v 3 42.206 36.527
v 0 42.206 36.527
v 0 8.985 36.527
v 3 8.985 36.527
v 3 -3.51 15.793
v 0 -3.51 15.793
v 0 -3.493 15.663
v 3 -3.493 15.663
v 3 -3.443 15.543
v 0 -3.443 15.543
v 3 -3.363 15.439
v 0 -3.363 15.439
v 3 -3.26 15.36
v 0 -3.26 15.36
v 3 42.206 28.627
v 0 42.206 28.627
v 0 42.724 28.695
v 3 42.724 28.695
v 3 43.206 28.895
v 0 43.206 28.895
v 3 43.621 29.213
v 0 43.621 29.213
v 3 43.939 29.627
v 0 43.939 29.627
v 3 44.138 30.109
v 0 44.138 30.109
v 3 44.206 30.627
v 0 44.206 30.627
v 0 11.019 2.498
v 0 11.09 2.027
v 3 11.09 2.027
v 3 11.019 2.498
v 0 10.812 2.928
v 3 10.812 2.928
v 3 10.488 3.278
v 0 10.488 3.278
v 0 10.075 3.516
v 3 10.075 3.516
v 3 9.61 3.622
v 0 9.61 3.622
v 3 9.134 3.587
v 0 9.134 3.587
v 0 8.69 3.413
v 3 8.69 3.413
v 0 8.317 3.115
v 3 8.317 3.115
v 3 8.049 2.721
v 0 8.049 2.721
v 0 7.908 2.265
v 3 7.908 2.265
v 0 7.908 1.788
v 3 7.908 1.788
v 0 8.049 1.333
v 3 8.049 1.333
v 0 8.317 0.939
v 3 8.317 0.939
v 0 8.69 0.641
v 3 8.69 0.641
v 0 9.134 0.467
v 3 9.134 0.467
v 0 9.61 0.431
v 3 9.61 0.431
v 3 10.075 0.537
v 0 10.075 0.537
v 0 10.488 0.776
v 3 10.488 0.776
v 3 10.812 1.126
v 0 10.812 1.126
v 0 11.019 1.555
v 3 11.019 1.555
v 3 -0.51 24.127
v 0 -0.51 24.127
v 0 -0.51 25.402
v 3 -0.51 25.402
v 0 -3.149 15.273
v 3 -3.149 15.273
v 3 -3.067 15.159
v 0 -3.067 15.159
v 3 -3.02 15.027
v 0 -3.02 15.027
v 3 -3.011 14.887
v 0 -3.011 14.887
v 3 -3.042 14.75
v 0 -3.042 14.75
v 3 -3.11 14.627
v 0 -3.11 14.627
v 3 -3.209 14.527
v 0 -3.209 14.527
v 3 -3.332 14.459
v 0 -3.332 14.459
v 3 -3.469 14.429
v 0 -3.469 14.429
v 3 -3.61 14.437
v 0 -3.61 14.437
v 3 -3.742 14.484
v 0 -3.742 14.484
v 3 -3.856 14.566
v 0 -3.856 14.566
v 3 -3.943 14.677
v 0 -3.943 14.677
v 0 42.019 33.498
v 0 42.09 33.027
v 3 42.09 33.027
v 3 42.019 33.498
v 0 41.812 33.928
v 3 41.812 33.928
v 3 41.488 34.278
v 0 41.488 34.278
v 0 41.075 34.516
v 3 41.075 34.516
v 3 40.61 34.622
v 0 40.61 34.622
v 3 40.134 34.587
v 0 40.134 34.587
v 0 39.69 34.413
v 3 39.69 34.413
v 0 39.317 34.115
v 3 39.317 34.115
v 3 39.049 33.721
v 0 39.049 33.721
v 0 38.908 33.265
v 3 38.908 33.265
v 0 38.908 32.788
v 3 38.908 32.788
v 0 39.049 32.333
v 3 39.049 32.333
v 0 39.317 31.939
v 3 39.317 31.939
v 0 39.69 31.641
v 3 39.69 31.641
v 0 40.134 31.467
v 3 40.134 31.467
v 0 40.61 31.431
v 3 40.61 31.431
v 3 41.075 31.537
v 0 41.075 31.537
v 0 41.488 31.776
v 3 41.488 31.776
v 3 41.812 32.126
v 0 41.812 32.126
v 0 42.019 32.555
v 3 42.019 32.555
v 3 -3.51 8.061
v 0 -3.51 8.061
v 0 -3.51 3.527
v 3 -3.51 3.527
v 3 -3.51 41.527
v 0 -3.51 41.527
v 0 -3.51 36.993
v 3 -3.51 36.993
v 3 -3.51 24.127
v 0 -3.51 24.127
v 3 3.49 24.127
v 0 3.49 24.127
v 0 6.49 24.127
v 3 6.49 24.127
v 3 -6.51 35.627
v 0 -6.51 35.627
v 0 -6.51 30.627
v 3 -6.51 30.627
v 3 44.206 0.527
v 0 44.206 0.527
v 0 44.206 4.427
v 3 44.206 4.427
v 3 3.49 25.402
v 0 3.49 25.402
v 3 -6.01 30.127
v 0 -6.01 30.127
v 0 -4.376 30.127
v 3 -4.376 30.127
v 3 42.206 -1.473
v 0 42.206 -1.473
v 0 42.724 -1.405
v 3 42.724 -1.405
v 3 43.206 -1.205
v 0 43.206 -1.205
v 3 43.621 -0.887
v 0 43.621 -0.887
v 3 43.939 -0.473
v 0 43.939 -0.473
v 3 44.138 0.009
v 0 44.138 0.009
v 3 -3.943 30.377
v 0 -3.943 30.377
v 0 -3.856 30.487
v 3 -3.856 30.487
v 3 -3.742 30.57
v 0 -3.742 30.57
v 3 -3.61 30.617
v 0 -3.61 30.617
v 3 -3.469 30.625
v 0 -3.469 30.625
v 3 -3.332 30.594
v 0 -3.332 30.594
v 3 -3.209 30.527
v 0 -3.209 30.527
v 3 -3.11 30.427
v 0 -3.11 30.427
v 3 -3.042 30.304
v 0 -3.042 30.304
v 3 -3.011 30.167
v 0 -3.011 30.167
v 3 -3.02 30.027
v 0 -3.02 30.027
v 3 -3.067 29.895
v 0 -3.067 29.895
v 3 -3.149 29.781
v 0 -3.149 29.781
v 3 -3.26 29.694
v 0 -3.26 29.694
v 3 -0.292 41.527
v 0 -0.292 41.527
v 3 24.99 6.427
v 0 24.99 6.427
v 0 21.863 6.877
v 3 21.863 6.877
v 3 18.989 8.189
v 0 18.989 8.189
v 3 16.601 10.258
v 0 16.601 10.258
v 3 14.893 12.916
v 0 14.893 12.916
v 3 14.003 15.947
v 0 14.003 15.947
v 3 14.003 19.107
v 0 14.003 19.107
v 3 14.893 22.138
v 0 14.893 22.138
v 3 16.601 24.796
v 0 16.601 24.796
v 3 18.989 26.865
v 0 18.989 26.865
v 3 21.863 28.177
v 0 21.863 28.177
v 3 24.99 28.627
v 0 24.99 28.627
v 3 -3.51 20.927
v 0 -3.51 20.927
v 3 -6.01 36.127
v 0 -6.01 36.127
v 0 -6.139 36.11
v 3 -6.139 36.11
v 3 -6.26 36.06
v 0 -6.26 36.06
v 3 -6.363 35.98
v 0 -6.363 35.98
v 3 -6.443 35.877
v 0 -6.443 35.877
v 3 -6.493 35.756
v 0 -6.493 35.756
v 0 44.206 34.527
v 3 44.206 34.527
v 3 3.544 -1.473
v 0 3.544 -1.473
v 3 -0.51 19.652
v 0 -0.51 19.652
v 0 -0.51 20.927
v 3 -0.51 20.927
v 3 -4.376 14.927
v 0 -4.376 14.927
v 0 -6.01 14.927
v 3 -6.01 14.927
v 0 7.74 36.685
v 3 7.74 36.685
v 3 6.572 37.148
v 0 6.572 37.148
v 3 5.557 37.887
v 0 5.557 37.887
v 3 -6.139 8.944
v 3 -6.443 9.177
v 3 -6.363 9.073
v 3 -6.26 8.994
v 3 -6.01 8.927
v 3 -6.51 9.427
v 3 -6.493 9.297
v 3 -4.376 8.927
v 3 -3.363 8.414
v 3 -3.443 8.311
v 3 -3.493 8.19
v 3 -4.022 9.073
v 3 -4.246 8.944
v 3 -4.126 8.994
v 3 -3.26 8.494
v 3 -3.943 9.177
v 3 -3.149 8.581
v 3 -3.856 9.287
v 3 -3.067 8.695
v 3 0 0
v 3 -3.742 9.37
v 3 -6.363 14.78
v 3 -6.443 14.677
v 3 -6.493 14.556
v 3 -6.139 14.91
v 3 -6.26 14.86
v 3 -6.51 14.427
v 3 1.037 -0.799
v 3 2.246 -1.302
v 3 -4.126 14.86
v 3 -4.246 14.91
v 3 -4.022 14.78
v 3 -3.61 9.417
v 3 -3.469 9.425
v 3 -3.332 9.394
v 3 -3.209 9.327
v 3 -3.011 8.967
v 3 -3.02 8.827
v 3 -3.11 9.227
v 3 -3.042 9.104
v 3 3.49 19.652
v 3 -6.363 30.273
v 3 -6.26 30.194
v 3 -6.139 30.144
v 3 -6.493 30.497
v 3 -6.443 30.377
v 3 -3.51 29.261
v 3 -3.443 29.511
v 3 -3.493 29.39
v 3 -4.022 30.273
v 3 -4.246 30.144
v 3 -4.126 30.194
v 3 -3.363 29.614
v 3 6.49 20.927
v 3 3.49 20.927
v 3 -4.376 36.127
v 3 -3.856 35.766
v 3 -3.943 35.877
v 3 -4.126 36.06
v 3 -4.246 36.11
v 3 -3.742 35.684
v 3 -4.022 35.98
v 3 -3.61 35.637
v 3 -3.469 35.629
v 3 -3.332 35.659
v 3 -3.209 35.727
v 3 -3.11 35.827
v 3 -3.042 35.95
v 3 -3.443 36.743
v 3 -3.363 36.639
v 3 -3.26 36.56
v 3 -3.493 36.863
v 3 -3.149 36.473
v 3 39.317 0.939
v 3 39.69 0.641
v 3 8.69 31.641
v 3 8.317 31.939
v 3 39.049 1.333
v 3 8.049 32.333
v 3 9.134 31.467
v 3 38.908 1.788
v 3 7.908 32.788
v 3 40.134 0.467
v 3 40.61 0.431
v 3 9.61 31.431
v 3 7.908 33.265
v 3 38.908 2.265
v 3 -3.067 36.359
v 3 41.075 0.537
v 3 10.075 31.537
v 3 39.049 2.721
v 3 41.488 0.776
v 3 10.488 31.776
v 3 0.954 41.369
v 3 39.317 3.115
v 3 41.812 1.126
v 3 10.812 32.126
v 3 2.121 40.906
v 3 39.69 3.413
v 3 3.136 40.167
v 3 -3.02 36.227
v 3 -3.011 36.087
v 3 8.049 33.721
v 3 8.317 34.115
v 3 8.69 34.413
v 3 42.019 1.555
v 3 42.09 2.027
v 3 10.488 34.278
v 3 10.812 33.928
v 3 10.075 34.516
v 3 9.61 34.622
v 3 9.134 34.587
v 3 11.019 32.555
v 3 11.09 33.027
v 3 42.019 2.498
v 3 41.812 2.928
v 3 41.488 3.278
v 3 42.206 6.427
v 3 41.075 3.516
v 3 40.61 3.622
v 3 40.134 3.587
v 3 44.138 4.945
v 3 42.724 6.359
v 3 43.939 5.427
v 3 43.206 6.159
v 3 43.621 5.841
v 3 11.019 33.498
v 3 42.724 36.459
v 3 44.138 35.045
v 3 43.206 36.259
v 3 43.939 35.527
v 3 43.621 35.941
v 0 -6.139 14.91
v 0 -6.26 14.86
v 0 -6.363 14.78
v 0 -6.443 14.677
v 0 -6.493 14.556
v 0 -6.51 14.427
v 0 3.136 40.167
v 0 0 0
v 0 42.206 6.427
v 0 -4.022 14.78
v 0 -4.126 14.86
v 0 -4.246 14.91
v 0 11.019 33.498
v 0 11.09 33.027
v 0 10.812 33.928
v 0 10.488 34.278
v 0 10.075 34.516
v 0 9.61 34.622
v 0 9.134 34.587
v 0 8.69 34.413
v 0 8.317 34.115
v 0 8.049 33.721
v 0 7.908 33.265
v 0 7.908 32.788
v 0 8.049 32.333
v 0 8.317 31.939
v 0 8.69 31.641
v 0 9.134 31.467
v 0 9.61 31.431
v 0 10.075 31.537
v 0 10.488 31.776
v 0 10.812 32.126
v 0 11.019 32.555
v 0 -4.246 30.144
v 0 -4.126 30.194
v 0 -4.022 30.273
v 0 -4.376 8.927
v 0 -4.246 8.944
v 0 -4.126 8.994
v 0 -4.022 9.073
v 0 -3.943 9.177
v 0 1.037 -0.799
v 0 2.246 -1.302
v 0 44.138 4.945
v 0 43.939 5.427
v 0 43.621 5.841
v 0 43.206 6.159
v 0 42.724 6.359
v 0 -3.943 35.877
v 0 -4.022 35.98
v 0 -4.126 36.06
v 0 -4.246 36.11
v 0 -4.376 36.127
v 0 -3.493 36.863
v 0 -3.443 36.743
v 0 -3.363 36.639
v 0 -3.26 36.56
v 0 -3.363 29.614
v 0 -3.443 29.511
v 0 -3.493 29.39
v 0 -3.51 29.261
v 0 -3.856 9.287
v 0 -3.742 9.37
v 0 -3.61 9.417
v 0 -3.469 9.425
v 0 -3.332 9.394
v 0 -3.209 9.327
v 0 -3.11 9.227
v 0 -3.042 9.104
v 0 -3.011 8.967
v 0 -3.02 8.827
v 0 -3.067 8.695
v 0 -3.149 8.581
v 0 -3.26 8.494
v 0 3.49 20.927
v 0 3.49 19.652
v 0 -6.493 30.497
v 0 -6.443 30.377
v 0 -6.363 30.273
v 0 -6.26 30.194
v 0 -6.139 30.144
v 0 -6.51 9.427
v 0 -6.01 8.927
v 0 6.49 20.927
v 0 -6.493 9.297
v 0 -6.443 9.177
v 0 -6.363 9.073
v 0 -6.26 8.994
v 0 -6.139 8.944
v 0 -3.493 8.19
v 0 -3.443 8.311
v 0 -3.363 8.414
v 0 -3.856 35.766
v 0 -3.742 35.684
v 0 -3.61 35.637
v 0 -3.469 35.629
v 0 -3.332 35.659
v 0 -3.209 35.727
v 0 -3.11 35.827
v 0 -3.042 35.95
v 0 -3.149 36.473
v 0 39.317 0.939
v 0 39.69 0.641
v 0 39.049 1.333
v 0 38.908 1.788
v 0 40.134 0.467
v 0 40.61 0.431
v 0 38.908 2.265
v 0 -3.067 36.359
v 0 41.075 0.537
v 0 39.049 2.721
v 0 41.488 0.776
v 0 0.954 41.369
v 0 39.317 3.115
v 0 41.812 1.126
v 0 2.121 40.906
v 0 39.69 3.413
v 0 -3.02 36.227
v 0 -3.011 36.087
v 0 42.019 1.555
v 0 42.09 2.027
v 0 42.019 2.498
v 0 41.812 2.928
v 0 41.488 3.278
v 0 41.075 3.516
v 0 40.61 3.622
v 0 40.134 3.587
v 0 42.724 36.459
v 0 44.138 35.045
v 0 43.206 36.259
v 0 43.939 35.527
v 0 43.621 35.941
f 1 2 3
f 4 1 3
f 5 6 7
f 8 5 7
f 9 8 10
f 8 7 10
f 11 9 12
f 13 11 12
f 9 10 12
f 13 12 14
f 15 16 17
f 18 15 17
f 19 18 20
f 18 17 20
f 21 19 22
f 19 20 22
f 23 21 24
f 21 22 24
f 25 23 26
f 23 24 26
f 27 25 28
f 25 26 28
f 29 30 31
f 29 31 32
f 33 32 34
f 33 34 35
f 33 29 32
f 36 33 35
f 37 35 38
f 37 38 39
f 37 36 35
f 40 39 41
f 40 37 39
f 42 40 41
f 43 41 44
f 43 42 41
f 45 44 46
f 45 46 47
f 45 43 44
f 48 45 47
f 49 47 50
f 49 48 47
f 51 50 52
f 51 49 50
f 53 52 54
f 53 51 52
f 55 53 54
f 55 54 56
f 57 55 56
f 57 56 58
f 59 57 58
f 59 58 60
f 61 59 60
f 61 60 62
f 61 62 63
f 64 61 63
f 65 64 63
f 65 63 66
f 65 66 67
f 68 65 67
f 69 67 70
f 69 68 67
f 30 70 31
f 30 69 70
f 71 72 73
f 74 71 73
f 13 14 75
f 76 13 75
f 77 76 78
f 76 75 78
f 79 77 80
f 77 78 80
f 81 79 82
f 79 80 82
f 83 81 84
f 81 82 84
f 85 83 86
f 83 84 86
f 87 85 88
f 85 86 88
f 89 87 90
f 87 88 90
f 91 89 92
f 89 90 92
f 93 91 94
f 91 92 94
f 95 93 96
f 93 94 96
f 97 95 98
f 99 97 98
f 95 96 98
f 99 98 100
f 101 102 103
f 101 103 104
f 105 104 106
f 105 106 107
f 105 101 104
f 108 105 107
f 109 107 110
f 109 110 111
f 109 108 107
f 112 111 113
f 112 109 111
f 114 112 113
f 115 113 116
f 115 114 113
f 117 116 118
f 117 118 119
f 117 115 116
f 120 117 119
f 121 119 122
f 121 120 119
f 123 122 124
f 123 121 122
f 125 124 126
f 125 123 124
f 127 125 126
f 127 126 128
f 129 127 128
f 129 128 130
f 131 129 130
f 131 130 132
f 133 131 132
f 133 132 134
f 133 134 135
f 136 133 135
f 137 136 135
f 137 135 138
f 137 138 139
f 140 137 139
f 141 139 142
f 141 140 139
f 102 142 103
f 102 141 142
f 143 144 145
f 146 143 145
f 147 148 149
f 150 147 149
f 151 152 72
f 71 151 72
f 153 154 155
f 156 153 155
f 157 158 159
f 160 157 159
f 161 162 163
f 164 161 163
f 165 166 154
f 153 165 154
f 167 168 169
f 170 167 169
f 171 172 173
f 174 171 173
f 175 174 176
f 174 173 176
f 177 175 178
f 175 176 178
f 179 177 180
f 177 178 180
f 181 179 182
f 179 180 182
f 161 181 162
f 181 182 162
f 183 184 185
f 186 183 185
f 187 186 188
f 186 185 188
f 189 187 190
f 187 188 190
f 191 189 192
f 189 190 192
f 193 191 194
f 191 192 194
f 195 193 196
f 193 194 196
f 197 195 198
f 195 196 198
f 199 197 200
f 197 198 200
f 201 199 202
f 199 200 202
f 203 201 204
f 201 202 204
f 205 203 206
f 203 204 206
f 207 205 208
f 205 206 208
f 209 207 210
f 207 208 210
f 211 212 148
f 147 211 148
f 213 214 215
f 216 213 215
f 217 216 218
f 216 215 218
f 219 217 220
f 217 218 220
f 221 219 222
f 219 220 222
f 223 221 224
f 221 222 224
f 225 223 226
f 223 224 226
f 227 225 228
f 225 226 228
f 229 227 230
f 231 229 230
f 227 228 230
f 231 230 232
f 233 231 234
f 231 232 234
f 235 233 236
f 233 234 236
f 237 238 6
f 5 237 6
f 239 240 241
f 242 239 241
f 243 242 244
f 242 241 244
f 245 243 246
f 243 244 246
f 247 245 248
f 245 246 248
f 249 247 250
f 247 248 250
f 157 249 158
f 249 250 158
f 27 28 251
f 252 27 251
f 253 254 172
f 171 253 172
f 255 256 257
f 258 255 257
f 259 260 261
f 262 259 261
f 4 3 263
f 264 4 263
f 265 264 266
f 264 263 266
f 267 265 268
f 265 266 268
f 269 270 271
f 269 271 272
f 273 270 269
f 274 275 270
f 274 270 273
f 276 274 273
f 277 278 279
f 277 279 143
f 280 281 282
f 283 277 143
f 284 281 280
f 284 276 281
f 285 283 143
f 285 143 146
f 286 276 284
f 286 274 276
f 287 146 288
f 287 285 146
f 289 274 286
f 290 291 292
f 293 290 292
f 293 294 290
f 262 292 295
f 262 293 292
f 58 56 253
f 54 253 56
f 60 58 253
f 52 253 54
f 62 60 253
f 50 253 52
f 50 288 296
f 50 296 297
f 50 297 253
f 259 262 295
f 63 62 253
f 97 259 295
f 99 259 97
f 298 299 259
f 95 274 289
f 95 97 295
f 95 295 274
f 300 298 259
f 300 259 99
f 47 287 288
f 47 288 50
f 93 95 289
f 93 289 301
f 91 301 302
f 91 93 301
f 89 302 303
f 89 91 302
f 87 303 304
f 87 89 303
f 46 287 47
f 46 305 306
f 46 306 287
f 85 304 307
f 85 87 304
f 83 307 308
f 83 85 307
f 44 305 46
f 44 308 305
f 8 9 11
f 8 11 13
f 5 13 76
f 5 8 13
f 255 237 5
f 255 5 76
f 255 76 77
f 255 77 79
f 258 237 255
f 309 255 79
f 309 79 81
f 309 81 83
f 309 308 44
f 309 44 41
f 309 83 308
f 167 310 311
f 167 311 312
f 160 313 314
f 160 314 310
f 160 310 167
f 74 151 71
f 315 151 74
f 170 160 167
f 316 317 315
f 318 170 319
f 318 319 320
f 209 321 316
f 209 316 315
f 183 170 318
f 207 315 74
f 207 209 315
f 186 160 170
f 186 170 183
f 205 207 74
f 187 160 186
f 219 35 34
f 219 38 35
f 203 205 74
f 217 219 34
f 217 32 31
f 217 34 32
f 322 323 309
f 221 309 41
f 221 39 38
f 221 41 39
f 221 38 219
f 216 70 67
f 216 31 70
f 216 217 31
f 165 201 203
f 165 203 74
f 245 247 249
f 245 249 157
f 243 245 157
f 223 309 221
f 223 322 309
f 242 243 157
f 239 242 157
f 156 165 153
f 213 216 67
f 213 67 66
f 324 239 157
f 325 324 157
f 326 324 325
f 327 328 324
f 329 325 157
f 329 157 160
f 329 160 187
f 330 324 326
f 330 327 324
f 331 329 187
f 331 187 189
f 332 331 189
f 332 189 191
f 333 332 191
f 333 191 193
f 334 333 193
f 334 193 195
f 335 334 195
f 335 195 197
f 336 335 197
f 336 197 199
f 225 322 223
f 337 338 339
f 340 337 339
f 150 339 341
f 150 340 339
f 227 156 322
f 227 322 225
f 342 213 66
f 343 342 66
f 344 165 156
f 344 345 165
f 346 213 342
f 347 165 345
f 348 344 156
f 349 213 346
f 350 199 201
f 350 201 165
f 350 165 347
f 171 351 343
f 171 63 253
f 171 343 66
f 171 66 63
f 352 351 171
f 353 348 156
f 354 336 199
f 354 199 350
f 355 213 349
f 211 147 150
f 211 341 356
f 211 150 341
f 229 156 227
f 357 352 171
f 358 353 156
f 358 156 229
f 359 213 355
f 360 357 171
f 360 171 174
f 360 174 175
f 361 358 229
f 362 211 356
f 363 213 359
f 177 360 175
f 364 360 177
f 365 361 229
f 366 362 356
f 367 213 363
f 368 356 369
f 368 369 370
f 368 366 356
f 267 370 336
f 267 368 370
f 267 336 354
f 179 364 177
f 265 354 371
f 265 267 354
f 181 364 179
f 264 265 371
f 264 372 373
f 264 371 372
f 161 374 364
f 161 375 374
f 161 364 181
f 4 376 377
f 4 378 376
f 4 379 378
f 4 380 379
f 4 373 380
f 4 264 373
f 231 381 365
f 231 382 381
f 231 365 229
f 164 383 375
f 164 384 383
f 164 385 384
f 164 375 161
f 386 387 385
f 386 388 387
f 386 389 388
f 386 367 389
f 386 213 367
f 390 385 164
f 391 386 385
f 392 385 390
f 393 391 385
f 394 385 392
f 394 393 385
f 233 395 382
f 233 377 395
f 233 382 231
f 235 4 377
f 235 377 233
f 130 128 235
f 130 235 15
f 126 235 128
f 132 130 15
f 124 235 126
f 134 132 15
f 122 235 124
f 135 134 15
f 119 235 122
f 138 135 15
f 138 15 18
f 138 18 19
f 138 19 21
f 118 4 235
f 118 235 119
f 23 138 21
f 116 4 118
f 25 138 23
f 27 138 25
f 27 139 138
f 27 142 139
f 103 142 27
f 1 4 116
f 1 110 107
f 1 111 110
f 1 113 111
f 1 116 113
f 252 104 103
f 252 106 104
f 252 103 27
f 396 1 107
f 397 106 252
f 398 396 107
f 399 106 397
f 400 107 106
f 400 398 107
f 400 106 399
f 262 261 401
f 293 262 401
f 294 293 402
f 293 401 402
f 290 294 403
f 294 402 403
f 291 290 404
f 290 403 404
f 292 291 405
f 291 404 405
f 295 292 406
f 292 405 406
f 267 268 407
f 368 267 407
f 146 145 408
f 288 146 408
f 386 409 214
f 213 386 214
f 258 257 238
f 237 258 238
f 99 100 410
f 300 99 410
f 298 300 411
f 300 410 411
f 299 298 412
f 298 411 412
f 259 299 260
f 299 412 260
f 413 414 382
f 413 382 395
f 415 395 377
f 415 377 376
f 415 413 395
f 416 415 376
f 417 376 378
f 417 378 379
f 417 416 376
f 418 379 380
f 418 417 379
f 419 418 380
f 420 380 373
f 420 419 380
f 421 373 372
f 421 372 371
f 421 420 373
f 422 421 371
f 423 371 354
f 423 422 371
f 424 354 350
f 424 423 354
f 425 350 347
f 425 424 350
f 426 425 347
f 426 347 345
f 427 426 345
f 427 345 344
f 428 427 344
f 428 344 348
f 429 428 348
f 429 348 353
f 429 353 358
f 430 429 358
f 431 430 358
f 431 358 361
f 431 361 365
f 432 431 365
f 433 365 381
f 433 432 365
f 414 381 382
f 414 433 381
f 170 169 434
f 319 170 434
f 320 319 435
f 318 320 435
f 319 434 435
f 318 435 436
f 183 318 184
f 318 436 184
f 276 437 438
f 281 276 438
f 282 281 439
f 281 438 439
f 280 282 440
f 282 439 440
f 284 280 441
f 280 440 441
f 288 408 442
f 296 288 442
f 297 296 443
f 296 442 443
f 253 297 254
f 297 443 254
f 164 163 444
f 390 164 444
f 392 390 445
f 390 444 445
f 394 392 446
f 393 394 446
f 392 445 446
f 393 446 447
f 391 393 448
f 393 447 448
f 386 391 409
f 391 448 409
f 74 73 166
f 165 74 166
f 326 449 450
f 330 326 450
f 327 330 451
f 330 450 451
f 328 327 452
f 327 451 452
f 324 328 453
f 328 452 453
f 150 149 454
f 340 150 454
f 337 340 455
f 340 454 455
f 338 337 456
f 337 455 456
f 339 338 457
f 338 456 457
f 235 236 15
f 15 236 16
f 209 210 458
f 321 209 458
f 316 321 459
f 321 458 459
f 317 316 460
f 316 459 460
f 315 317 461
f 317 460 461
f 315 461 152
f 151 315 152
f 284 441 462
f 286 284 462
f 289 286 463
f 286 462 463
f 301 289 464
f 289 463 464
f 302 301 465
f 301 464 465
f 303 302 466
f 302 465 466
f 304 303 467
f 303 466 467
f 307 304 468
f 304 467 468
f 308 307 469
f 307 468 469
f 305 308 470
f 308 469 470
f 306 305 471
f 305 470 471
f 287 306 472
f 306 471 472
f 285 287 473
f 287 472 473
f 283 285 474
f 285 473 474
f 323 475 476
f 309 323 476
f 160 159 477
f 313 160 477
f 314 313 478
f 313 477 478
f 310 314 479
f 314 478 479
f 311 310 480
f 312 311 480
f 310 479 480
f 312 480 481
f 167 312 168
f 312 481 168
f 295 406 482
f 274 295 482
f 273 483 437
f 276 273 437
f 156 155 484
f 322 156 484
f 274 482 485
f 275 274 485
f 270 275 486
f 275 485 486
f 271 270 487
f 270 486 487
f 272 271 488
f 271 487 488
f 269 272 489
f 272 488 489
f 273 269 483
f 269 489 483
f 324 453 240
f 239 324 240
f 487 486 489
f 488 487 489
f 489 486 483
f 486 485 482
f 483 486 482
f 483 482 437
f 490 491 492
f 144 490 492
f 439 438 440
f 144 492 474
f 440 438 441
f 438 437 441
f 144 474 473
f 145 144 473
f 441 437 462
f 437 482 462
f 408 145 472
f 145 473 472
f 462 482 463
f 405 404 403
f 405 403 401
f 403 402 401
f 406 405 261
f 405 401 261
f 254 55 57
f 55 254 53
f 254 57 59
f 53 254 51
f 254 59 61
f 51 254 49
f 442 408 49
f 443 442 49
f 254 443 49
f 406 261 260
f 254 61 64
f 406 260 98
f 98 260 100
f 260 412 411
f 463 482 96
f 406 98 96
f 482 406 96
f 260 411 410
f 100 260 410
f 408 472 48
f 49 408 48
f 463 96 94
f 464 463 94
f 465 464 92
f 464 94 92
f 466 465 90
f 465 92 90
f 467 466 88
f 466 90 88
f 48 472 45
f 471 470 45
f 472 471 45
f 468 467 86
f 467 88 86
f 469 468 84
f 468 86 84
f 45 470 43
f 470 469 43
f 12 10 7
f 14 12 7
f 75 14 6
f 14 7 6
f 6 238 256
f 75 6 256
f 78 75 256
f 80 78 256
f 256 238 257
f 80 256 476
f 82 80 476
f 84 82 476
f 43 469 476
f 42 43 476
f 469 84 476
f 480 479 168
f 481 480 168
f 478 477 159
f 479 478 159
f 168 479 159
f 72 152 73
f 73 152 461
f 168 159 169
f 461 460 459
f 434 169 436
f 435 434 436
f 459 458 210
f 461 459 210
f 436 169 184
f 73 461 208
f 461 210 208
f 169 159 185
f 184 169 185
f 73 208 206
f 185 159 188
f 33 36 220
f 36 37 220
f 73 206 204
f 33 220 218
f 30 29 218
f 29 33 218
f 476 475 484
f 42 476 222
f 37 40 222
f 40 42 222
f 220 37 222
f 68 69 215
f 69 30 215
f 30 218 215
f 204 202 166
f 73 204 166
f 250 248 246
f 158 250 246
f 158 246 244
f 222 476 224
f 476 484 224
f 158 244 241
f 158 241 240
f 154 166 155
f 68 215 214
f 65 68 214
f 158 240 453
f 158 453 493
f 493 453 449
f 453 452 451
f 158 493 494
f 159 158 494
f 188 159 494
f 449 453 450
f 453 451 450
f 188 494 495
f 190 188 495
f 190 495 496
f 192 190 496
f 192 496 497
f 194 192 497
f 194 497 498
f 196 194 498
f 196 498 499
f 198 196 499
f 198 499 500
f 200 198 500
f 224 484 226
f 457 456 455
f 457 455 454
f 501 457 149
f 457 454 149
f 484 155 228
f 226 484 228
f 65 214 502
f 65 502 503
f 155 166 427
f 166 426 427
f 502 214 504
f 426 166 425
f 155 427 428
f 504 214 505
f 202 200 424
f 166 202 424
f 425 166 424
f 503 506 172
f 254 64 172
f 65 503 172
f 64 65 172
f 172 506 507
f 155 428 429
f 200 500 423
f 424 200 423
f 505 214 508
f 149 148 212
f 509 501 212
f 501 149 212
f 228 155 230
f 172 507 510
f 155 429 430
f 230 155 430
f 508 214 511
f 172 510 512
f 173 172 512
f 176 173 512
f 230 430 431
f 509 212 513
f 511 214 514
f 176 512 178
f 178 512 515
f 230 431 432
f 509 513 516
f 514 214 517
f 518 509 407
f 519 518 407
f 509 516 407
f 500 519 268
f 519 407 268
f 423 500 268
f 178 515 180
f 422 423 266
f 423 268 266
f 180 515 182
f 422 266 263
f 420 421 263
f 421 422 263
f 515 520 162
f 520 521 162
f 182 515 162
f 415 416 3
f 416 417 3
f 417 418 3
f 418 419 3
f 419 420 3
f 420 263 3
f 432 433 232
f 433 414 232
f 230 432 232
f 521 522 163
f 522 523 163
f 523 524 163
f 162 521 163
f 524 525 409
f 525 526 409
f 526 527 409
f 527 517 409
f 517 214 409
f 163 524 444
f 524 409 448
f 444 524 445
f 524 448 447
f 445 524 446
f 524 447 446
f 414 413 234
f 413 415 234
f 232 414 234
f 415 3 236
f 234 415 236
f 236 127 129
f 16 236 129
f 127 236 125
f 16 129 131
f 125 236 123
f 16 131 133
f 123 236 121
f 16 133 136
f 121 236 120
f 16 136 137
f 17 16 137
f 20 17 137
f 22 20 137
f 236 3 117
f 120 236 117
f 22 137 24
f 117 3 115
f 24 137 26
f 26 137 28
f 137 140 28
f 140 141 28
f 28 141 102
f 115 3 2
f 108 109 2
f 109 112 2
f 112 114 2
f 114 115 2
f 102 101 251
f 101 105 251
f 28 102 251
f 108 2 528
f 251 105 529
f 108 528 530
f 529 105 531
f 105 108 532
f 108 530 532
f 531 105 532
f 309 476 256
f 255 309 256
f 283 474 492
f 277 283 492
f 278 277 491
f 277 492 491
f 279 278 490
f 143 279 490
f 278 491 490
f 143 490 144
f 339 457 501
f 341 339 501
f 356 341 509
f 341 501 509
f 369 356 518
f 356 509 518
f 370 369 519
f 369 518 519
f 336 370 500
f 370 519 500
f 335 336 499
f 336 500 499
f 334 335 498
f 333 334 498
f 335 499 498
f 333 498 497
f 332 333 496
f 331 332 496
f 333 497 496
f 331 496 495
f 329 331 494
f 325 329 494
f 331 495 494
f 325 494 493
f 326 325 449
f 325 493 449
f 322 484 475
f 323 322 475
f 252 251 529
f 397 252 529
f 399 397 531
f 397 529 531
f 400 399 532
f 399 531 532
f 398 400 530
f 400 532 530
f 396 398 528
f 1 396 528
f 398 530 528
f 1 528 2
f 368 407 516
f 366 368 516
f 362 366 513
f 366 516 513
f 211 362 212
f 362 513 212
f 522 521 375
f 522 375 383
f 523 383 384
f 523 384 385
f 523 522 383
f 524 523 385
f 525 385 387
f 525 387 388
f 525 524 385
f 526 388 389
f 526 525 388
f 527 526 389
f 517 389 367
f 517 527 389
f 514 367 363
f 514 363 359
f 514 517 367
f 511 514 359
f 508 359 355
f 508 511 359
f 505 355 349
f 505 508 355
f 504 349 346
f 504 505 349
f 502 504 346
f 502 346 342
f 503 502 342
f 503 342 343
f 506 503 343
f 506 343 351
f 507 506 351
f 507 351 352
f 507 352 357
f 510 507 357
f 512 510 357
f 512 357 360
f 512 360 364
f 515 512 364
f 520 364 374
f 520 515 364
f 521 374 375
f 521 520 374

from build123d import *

# Parameters (mm, degrees)
F0_R     = 1.6
F1_DEPTH = 3


# Not quite as in the source:
# - ends of sketch curves that miss each other by under 0.0002 mm in the source are joined


with BuildPart() as f1:
    # F0 (on Right) → F1 (new body)
    with BuildSketch(Plane.YZ):
        with BuildLine():
            Line((6.490295, 24.126887), (6.490295, 20.926875))
            Line((6.490295, 20.926875), (3.490295, 20.926875))
            Line((3.490295, 20.926875), (3.490295, 19.651881))
            Line((3.490295, 19.651881), (-0.509733, 19.651881))
            Line((-0.509733, 19.651881), (-0.509733, 20.926875))
            Line((-0.509733, 20.926875), (-3.509705, 20.926875))
            Line((-3.509705, 20.926875), (-3.509702, 15.792903))
            ThreePointArc((-3.509702, 15.792903), (-3.4427150061, 15.542903527), (-3.2597030539, 15.3598909066))
            ThreePointArc((-3.2597030539, 15.3598909066), (-3.1561520924, 14.5733251264), (-3.9427177764, 14.6768791291))
            ThreePointArc((-3.9427177764, 14.6768791291), (-4.1257299355, 14.8598916646), (-4.37573, 14.926879))
            Line((-4.37573, 14.926879), (-6.009757, 14.926882))
            ThreePointArc((-6.009757, 14.926882), (-6.3633103906, 14.7804353906), (-6.509757, 14.426882))
            Line((-6.509757, 14.426882), (-6.509757, 9.426885))
            ThreePointArc((-6.509757, 9.426885), (-6.3633103906, 9.0733316094), (-6.009757, 8.926885))
            Line((-6.009757, 8.926885), (-4.375728, 8.926885))
            ThreePointArc((-4.375728, 8.926885), (-4.125728527, 8.9938719939), (-3.9427159066, 9.1768839461))
            ThreePointArc((-3.9427159066, 9.1768839461), (-3.1561511264, 9.2804349076), (-3.2597051291, 8.4938692236))
            ThreePointArc((-3.2597051291, 8.4938692236), (-3.4427176646, 8.3108560645), (-3.509705, 8.060856))
            Line((-3.509705, 8.060856), (-3.509702, 3.526887))
            Line((-3.509702, 3.526887), (0, 0))
            ThreePointArc((0, 0), (1.6251015018, -1.0901687381), (3.544158, -1.473111))
            Line((3.544158, -1.473111), (42.206461, -1.47311))
            ThreePointArc((42.206461, -1.47311), (43.6206745624, -0.8873235624), (44.206461, 0.52689))
            Line((44.206461, 0.52689), (44.206463, 4.426926))
            ThreePointArc((44.206463, 4.426926), (43.6206765624, 5.8411395624), (42.206463, 6.426926))
            Line((42.206463, 6.426926), (24.990243, 6.426926))
            ThreePointArc((24.990243, 6.426926), (13.890243, 17.526926), (24.990243, 28.626926))
            Line((24.990243, 28.626926), (42.206463, 28.626926))
            ThreePointArc((42.206463, 28.626926), (43.6206765624, 29.2127124376), (44.206463, 30.626926))
            Line((44.206463, 30.626926), (44.206463, 34.526876))
            ThreePointArc((44.206463, 34.526876), (43.6206745624, 35.9410875624), (42.206461, 36.526874))
            Line((42.206461, 36.526874), (8.985147, 36.526873))
            ThreePointArc((8.985147, 36.526873), (7.141367531, 36.8792416388), (5.5574640867, 37.8866820921))
            Line((5.5574640867, 37.8866820921), (3.135704, 40.167064))
            ThreePointArc((3.135704, 40.167064), (1.551800469, 41.1745043612), (-0.291979, 41.526873))
            Line((-0.291979, 41.526873), (-3.509705, 41.526873))
            Line((-3.509705, 41.526873), (-3.509702, 36.992904))
            ThreePointArc((-3.509702, 36.992904), (-3.4427150061, 36.742904527), (-3.2597030539, 36.5598919066))
            ThreePointArc((-3.2597030539, 36.5598919066), (-3.1561520924, 35.7733261264), (-3.9427177764, 35.8768801291))
            ThreePointArc((-3.9427177764, 35.8768801291), (-4.1257299355, 36.0598926646), (-4.37573, 36.12688))
            Line((-4.37573, 36.12688), (-6.009757, 36.126883))
            ThreePointArc((-6.009757, 36.126883), (-6.3633103906, 35.9804363906), (-6.509757, 35.626883))
            Line((-6.509757, 35.626883), (-6.509757, 30.626886))
            ThreePointArc((-6.509757, 30.626886), (-6.3633103906, 30.2733326094), (-6.009757, 30.126886))
            Line((-6.009757, 30.126886), (-4.375728, 30.126886))
            ThreePointArc((-4.375728, 30.126886), (-4.125728527, 30.1938729939), (-3.9427159066, 30.3768849461))
            ThreePointArc((-3.9427159066, 30.3768849461), (-3.1561511264, 30.4804359076), (-3.2597051291, 29.6938702236))
            ThreePointArc((-3.2597051291, 29.6938702236), (-3.4427176646, 29.5108580645), (-3.509705, 29.260858))
            Line((-3.509705, 29.260858), (-3.509705, 24.126887))
            Line((-3.509705, 24.126887), (-0.509733, 24.126887))
            Line((-0.509733, 24.126887), (-0.509733, 25.401881))
            Line((-0.509733, 25.401881), (3.490295, 25.401881))
            Line((3.490295, 25.401881), (3.490295, 24.126887))
            Line((3.490295, 24.126887), (6.490295, 24.126887))
        make_face()
        with Locations((9.490194, 2.026885)):
            Circle(F0_R, mode=Mode.SUBTRACT)
        with Locations((40.490194, 2.026885)):
            Circle(F0_R, mode=Mode.SUBTRACT)
        with Locations((9.490194, 33.026885)):
            Circle(F0_R, mode=Mode.SUBTRACT)
        with Locations((40.490194, 33.026885)):
            Circle(F0_R, mode=Mode.SUBTRACT)
    extrude(amount=F1_DEPTH)


solid = f1.part
